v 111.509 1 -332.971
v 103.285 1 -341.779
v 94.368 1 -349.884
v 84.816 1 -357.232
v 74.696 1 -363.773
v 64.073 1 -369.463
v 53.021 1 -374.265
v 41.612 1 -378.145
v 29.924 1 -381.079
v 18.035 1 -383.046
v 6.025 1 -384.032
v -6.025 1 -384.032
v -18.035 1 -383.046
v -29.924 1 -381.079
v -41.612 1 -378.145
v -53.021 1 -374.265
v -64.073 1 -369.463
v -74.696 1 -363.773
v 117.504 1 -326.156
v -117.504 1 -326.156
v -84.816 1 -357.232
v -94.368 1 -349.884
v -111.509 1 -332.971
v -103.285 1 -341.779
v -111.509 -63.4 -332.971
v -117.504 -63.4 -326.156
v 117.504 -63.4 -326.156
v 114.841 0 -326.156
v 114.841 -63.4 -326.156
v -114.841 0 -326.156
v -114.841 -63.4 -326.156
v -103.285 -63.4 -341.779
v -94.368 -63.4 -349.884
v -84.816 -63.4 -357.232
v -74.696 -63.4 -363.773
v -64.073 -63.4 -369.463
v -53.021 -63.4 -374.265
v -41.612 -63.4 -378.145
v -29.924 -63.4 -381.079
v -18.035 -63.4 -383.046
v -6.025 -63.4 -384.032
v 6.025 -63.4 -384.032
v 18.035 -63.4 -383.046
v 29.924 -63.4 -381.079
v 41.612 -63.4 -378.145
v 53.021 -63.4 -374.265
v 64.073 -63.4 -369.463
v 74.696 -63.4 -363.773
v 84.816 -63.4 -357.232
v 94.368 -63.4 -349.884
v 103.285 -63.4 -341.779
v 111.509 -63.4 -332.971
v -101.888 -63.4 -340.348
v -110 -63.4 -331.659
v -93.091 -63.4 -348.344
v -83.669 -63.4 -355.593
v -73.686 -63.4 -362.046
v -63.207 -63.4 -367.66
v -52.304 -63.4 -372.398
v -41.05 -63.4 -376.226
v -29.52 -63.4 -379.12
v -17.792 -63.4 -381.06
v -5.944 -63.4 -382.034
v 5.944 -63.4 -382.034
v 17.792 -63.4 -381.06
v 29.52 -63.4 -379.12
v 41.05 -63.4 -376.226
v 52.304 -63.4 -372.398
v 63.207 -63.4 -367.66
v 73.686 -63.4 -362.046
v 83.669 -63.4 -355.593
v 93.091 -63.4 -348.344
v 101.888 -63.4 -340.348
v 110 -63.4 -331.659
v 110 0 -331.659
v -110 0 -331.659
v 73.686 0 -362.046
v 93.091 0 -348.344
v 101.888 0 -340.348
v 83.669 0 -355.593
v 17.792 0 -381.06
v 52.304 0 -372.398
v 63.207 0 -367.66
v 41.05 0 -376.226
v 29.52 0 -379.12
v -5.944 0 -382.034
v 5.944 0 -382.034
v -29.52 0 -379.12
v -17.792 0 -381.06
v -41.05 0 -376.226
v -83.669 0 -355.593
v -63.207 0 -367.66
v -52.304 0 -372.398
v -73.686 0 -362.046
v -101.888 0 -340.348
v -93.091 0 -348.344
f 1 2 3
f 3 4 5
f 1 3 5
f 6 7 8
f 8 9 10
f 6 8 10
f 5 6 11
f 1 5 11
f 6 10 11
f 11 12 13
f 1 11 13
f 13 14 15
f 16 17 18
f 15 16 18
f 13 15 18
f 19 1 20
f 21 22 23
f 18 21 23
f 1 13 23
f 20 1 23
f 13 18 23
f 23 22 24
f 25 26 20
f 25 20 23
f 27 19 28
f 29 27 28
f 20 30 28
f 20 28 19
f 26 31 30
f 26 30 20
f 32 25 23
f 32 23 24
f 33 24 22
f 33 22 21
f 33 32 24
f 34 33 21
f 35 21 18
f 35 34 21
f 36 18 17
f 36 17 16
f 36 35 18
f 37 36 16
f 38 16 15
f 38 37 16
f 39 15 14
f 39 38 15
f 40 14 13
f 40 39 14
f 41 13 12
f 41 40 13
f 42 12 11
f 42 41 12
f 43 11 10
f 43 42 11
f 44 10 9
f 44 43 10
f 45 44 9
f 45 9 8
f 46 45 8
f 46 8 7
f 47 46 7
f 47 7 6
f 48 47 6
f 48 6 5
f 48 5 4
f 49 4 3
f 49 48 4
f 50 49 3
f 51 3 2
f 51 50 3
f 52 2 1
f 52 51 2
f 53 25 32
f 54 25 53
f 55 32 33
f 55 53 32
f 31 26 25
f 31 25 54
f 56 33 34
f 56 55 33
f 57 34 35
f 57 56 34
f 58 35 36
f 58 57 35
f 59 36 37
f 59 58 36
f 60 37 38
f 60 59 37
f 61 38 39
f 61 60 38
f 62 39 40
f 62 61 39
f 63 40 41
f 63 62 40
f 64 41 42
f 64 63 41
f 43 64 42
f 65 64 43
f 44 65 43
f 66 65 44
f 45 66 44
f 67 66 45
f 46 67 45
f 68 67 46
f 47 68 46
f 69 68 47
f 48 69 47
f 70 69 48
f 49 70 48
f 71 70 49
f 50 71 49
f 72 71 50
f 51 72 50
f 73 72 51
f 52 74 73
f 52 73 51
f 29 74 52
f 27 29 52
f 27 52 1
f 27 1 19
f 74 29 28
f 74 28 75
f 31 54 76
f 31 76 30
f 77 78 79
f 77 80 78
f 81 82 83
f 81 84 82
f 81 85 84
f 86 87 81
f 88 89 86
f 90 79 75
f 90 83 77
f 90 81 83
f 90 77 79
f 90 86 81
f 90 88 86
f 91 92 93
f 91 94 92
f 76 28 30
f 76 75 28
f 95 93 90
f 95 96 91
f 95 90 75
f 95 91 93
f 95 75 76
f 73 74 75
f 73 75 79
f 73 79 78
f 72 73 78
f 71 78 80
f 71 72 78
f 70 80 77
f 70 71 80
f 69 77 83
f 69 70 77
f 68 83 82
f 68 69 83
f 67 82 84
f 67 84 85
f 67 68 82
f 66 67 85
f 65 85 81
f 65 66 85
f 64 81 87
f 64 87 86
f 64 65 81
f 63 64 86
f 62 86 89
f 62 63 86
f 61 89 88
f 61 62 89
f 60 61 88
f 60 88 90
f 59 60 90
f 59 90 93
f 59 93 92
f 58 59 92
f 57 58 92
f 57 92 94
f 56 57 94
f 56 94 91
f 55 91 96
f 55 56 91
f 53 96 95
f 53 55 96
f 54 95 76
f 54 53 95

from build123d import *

# Parameters (mm, degrees)
BOSS_EXTRUDE1_DEPTH = 1
BOSS_EXTRUDE2_START = 63.399999946
BOSS_EXTRUDE2_DEPTH = 63.399999946


with BuildPart() as part:
    # Sketch3 → Boss-Extrude1 (new body)
    with BuildSketch(Plane(origin=(0, 0, 0), x_dir=(1, 0, 0), z_dir=(0, 1, 0))):
        with BuildLine():
            Line((-117.504462868, 326.155640462), (-111.509184915, 332.971148344))
            ThreePointArc((-111.509184915, 332.971148344), (0, 384.155640476), (111.509184915, 332.971148344))
            Line((111.509184915, 332.971148344), (117.504462868, 326.155640462))
            Line((117.504462868, 326.155640462), (-117.504462868, 326.155640462))
        make_face()
    extrude(amount=BOSS_EXTRUDE1_DEPTH)

    # Sketch4 → Boss-Extrude2 (add)
    with BuildSketch(Plane.XZ.offset(BOSS_EXTRUDE2_START)):
        with BuildLine():
            Line((-117.504462868, -326.155640462), (-111.509184915, -332.971148344))
            ThreePointArc((-111.509184915, -332.971148344), (0, -384.155640476), (111.509184915, -332.971148344))
            Line((111.509184915, -332.971148344), (117.504462868, -326.155640462))
            Line((117.504462868, -326.155640462), (114.84078994, -326.155640462))
            Line((114.84078994, -326.155640462), (110, -331.658711753))
            ThreePointArc((110, -331.658711753), (0, -382.155640476), (-110, -331.658711753))
            Line((-110, -331.658711753), (-114.84078994, -326.155640462))
            Line((-114.84078994, -326.155640462), (-117.504462868, -326.155640462))
        make_face()
    extrude(amount=-BOSS_EXTRUDE2_DEPTH)


solid = part.part
